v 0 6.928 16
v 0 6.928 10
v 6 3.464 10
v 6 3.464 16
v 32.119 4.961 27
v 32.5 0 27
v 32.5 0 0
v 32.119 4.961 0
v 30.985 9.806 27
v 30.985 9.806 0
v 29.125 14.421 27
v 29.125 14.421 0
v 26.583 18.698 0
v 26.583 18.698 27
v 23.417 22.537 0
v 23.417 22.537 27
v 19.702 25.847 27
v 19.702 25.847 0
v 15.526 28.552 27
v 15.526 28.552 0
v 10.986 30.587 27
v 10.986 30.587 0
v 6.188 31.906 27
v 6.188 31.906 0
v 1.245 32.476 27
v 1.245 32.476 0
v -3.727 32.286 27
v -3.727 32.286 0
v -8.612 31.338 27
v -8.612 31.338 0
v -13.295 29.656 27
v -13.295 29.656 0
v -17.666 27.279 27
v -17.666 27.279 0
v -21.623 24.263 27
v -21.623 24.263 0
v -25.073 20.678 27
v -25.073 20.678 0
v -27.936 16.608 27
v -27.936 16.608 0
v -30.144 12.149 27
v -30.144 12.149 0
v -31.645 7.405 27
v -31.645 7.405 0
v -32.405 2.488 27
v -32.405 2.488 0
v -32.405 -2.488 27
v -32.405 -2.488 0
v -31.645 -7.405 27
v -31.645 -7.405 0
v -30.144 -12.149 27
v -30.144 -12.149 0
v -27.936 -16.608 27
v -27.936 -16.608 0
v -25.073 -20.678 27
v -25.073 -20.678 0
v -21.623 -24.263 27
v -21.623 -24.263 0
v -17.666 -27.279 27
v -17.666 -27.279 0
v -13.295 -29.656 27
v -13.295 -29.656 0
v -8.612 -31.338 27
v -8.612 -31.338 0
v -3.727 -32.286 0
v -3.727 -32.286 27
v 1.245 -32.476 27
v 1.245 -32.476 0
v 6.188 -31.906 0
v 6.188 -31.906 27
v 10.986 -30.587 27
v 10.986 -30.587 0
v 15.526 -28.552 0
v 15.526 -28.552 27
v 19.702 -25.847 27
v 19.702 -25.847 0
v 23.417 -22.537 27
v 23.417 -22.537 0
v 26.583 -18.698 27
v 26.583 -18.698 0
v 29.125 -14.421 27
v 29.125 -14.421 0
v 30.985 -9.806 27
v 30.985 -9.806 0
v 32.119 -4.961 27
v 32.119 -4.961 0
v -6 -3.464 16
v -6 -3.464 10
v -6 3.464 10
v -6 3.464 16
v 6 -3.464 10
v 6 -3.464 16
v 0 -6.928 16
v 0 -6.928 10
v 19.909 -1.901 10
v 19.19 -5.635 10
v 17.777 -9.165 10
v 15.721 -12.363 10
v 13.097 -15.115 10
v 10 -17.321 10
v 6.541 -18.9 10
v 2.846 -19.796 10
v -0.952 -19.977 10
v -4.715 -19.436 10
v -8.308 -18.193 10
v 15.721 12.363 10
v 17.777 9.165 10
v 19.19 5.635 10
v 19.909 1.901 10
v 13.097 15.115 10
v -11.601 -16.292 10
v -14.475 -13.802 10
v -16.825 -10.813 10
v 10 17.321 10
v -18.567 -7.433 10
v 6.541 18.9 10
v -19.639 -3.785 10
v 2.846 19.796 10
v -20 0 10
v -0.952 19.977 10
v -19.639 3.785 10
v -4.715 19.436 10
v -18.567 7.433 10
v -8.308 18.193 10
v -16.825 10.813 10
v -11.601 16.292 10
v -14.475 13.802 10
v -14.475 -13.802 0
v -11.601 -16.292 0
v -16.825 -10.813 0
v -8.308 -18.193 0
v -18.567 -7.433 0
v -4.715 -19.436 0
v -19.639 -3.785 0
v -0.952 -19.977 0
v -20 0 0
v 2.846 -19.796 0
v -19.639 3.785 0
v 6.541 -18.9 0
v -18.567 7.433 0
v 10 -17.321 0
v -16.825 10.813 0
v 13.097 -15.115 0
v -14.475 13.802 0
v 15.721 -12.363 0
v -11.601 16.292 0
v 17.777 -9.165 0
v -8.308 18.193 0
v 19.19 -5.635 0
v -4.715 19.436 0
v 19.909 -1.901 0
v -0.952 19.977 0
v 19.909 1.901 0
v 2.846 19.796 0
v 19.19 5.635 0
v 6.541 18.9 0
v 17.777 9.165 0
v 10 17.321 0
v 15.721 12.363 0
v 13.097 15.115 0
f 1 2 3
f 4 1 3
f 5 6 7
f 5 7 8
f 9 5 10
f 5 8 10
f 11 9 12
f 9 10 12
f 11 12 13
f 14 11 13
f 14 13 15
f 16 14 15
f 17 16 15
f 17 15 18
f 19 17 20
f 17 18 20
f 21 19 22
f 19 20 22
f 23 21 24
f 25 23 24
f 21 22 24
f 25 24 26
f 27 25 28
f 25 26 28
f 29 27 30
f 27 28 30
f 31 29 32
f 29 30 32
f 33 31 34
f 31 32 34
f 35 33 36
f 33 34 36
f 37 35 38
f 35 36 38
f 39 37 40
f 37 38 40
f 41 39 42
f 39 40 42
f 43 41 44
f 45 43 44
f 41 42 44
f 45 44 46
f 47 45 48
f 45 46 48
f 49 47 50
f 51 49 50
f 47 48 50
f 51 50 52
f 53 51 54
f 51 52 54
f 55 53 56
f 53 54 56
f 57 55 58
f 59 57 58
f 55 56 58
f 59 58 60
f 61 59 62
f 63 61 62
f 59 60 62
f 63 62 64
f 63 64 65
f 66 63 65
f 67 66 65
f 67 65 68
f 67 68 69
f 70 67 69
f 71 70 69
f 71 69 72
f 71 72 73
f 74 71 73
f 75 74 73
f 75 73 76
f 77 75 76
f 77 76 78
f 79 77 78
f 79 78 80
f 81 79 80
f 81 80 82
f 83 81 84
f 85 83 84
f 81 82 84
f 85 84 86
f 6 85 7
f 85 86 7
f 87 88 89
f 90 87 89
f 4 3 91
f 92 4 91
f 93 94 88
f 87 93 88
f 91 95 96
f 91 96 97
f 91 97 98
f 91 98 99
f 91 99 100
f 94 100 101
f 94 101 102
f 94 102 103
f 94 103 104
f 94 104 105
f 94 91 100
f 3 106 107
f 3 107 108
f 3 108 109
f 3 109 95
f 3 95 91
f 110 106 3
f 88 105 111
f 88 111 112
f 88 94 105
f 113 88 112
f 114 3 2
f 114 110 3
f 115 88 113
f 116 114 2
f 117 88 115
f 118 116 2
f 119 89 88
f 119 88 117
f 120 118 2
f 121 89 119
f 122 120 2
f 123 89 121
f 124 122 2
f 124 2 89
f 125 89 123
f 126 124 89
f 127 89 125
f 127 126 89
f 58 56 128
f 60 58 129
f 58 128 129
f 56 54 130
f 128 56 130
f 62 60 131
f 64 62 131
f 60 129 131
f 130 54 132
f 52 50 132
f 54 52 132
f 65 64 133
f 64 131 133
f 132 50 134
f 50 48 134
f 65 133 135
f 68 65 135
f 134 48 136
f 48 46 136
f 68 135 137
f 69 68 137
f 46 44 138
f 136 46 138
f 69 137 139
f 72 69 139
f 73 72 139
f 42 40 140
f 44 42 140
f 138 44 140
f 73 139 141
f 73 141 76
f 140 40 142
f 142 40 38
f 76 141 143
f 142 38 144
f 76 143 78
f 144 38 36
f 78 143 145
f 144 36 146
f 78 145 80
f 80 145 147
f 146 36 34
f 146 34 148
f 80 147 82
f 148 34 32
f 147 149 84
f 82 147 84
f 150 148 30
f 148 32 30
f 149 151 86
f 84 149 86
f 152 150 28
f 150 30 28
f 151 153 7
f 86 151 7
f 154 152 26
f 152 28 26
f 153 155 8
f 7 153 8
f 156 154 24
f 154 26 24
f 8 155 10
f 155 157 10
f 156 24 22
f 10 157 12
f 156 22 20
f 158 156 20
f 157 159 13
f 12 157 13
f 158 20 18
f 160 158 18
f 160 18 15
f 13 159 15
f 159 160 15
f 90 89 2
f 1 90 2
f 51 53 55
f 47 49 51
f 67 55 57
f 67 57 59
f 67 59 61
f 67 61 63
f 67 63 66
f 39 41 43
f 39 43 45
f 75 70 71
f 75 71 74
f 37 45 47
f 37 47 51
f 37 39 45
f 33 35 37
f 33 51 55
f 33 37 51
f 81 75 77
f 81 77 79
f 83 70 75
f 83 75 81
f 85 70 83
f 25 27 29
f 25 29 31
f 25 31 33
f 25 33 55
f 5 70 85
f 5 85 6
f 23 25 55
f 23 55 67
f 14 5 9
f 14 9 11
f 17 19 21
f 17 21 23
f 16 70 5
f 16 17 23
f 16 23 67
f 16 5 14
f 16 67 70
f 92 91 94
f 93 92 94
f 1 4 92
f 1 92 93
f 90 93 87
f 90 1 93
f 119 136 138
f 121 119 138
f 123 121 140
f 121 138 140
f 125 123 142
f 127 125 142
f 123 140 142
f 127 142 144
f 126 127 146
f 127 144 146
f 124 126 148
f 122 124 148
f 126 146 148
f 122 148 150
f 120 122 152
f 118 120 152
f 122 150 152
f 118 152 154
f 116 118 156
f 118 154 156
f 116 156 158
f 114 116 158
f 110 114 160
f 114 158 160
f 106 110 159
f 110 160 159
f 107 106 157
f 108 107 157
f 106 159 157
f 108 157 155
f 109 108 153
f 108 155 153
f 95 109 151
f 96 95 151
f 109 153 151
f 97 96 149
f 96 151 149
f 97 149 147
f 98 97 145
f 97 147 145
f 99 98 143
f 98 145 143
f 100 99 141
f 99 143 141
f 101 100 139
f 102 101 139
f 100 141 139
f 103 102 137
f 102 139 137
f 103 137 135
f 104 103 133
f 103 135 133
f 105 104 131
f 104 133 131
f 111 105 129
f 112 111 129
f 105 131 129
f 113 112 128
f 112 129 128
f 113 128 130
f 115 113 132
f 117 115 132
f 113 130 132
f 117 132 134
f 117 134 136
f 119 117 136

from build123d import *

# Parameters (mm, degrees)
SKETCH_1_R          = 32.5
EXTRUDE_1_DEPTH     = 27
SKETCH_2_R          = 20
CUT_EXTRUDE_1_DEPTH = 10
CUT_EXTRUDE_2_DEPTH = 6


with BuildPart() as part:
    # 草图1 → 凸台-拉伸1 (new body)
    with BuildSketch(Plane.XY):
        Circle(SKETCH_1_R)
    extrude(amount=EXTRUDE_1_DEPTH)

    # 草图2 → 切除-拉伸1 (cut)
    with BuildSketch(Plane(origin=(0, 0, 0), x_dir=(-1, 0, 0), z_dir=(0, 0, -1))):
        Circle(SKETCH_2_R)
    extrude(amount=-CUT_EXTRUDE_1_DEPTH, mode=Mode.SUBTRACT)

    # 草图3 → 切除-拉伸2 (cut)
    with BuildSketch(Plane(origin=(0, 0, 10), x_dir=(-1, 0, 0), z_dir=(0, 0, -1))):
        Polygon((6, 3.464101615), (0, 6.92820323), (-6, 3.464101615), (-6, -3.464101615), (0, -6.92820323), (6, -3.464101615), align=None)
    extrude(amount=-CUT_EXTRUDE_2_DEPTH, mode=Mode.SUBTRACT)


solid = part.part
